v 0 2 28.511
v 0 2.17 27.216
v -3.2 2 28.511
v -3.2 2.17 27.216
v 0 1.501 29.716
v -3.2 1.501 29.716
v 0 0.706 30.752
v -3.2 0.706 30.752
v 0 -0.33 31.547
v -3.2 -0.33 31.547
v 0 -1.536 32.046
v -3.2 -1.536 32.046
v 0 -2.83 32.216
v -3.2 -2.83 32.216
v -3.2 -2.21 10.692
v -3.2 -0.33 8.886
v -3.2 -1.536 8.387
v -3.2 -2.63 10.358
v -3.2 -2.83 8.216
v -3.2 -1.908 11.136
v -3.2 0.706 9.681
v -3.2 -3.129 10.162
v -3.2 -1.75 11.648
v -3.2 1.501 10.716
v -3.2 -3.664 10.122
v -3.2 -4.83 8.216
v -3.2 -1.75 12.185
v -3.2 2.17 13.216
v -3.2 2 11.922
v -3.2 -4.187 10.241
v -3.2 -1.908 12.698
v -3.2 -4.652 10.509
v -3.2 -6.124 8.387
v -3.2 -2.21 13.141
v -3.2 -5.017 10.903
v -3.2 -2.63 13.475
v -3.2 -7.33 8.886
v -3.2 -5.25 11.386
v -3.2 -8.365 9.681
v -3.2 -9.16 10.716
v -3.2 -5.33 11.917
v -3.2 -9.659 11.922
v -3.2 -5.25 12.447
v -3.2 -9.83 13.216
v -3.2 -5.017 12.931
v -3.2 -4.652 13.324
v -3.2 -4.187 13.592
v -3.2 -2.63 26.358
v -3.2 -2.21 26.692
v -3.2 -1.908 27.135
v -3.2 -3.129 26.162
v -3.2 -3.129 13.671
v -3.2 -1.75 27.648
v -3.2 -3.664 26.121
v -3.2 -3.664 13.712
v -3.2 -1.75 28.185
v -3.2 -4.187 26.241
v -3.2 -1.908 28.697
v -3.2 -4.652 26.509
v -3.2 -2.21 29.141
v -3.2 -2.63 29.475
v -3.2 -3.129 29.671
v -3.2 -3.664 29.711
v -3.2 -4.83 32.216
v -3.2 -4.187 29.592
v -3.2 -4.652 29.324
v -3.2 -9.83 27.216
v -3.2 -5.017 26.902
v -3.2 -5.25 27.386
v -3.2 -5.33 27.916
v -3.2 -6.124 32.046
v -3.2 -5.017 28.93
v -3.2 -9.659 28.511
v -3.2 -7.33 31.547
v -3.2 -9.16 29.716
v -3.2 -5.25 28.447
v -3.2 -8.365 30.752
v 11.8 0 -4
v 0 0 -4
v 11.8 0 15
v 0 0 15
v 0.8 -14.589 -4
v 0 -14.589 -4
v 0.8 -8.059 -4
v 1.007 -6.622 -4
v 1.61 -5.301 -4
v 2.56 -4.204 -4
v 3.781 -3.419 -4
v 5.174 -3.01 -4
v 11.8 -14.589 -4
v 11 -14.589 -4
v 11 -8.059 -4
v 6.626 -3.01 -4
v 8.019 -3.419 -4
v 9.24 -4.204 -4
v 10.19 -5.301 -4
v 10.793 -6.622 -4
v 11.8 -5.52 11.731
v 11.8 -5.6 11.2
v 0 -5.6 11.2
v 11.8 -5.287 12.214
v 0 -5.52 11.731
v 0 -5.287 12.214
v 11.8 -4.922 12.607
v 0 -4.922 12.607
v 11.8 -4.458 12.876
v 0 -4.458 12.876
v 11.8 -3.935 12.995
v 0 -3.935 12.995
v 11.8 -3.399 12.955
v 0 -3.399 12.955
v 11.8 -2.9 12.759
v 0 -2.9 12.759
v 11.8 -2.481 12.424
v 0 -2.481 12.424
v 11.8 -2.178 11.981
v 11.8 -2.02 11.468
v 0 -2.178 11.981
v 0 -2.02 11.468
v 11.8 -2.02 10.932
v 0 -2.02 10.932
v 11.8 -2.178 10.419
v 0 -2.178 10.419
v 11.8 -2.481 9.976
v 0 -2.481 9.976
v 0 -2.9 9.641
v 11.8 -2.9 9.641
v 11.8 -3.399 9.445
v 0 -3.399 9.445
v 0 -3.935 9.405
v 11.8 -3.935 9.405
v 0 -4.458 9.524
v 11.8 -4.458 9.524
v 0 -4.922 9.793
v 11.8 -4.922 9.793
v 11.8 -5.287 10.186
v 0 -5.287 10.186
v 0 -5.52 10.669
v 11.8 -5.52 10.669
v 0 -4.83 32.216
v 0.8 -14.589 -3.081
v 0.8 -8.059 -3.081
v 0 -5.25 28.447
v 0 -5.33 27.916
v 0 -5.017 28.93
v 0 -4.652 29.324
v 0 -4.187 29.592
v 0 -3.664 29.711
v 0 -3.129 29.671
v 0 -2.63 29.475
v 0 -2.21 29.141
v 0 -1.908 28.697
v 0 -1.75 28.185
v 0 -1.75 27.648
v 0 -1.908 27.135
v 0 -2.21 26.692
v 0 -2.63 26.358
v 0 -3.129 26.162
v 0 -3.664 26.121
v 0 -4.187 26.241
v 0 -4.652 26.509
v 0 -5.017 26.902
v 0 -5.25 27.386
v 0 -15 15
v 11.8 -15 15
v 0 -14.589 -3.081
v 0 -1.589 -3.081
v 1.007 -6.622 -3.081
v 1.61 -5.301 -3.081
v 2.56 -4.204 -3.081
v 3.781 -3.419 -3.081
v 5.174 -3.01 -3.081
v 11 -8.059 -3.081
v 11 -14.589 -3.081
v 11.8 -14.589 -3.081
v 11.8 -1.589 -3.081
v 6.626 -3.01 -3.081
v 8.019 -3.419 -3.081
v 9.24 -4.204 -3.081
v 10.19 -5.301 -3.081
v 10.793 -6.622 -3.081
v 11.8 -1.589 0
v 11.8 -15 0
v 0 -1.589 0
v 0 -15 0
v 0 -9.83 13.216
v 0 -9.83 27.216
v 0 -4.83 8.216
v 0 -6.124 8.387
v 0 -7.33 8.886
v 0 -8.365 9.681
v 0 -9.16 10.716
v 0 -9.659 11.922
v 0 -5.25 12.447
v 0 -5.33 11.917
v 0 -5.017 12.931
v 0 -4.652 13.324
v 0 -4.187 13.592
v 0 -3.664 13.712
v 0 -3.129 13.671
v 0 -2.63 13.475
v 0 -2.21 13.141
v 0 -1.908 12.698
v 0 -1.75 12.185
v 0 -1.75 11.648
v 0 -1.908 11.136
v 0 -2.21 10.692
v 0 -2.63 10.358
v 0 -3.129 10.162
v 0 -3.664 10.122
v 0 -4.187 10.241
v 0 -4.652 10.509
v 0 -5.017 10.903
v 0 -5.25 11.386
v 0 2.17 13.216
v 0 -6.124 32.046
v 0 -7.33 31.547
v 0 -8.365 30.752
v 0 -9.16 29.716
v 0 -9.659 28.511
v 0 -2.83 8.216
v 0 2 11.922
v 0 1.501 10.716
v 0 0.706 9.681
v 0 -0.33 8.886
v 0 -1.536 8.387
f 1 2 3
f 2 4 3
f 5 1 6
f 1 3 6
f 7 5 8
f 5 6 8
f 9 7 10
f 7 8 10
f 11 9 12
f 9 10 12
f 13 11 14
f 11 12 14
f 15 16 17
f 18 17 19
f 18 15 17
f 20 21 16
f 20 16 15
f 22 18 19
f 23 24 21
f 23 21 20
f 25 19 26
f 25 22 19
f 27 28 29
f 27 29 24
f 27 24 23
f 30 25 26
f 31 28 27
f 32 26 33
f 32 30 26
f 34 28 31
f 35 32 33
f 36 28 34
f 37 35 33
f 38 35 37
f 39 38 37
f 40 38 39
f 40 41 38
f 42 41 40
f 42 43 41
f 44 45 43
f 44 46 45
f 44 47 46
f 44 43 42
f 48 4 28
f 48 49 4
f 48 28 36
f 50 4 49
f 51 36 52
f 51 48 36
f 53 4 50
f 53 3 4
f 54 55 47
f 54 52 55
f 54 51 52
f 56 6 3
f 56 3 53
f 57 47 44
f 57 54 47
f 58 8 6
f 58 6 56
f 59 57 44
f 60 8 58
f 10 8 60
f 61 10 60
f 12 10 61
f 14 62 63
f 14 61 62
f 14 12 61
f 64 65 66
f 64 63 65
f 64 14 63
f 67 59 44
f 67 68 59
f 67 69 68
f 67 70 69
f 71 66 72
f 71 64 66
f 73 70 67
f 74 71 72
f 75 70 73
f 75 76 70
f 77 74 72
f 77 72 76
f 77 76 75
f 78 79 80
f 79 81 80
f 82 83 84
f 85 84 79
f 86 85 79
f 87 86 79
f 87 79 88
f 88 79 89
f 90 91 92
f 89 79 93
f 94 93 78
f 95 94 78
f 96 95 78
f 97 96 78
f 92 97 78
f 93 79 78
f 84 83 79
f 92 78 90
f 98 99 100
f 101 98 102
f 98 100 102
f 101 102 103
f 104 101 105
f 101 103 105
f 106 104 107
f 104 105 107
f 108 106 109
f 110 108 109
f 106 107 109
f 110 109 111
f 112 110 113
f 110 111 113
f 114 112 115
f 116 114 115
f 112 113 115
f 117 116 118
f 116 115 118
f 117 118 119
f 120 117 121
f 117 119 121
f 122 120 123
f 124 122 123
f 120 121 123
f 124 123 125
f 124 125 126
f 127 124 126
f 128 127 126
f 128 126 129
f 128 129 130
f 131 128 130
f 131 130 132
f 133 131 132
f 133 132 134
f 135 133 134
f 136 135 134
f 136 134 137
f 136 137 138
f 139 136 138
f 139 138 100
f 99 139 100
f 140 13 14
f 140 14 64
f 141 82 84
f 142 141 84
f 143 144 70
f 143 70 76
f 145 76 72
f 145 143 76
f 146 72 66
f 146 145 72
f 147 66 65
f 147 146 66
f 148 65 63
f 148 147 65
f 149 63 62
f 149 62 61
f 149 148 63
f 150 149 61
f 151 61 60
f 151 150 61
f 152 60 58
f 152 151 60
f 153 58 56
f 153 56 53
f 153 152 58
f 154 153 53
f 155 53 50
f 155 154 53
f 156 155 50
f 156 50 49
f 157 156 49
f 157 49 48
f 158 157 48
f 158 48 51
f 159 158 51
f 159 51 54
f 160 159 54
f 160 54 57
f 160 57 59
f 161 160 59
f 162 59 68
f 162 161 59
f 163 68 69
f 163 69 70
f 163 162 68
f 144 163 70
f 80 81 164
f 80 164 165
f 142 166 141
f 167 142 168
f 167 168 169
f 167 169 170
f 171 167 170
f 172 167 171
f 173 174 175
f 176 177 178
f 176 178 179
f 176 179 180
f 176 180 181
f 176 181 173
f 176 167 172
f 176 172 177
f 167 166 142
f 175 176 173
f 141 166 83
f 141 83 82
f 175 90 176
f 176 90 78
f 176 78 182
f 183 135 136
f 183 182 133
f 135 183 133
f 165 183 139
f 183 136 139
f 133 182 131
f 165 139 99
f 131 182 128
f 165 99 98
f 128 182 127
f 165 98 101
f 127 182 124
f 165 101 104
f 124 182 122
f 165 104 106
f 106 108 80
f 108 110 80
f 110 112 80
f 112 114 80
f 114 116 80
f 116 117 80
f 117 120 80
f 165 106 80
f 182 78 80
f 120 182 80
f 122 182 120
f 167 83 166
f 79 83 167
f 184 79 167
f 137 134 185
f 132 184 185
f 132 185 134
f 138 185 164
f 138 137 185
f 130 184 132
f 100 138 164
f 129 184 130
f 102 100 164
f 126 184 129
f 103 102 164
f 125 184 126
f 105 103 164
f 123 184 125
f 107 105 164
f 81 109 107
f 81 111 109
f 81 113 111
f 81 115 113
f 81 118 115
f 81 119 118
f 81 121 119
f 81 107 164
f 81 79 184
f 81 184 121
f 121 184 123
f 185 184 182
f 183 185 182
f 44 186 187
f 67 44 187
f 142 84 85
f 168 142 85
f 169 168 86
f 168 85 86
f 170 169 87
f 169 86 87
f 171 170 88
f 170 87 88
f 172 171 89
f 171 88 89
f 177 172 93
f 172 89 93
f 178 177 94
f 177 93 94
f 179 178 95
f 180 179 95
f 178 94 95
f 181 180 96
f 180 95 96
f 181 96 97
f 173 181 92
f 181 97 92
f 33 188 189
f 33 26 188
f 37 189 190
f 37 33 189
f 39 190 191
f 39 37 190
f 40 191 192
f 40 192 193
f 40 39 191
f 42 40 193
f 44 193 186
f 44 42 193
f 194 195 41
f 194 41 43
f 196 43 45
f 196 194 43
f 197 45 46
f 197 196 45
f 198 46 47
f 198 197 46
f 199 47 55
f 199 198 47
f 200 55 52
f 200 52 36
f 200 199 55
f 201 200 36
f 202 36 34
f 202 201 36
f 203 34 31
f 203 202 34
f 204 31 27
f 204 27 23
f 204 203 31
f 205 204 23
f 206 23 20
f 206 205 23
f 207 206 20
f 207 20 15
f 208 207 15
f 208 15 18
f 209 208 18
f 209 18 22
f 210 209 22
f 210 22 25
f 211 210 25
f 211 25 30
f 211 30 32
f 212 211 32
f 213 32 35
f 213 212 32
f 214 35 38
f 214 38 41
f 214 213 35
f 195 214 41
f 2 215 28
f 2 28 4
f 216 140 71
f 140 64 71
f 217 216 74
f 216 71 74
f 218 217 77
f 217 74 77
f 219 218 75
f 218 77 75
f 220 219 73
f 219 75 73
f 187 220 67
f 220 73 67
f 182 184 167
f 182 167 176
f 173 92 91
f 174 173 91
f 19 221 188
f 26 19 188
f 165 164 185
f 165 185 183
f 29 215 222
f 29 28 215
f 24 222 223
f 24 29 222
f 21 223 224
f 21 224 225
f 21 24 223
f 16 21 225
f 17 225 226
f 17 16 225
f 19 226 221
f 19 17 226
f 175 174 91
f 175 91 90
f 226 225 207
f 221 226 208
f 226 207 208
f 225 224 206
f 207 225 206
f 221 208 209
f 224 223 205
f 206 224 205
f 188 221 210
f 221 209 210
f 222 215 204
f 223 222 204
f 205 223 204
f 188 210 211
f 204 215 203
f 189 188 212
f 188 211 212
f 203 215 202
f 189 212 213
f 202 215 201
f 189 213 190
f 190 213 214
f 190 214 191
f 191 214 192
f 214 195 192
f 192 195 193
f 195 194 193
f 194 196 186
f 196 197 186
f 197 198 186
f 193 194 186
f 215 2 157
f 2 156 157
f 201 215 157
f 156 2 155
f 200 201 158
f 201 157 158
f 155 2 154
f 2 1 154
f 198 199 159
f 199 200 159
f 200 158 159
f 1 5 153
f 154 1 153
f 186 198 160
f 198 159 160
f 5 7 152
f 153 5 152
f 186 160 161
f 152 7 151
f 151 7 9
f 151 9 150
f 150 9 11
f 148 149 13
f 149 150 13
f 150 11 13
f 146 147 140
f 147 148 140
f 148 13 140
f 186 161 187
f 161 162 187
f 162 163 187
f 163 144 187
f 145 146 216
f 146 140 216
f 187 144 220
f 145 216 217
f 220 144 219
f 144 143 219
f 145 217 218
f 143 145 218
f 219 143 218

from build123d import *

# Parameters (mm, degrees)
F0_W      = 11.8
F0_H      = 15
F1_DEPTH  = 15
F2_R      = 1.8
F3_DEPTH  = 25
F4_W      = 12
F4_H      = 24
F4_R      = 1.8
F5_DEPTH  = 3.2
F6_R      = 5
F7_W      = 11.8
F7_H      = 1.589112
F8_DEPTH  = 4
F9_W      = 11.8
F9_H      = 0.918874
F10_DEPTH = 13
F12_DEPTH = 2


with BuildPart() as f1:
    # F0 (on Front) → F1 (new body)
    with BuildSketch(Plane.XZ):
        with Locations((5.9, 7.5)):
            Rectangle(F0_W, F0_H)
    extrude(amount=F1_DEPTH)

    # F2 (on face) → F3 (cut)
    with BuildSketch(Plane(origin=(0, 0, 0), x_dir=(0, -1, 0), z_dir=(-1, 0, 0))):
        with Locations((3.8, 11.2)):
            Circle(F2_R)
    extrude(amount=-F3_DEPTH, mode=Mode.SUBTRACT)

    # F7 (on face) → F8 (join)
    with BuildSketch(Plane(origin=(0, 0, 0), x_dir=(1, 0, 0), z_dir=(0, 0, -1))):
        with Locations((5.9, 0.794556)):
            Rectangle(F7_W, F7_H)
    extrude(amount=F8_DEPTH)

    # F9 (on face) → F10 (join)
    with BuildSketch(Plane.XZ.offset(1.589112)):
        with Locations((5.9, -3.540563)):
            Rectangle(F9_W, F9_H)
    extrude(amount=F10_DEPTH)

    # F11 (on face) → F12 (cut)
    with BuildSketch(Plane(origin=(0, 0, -4), x_dir=(1, 0, 0), z_dir=(0, 0, -1))):
        with BuildLine():
            Line((11, 14.589112), (0.8, 14.589112))
            Line((0.8, 14.589112), (0.8, 8.058546))
            ThreePointArc((0.8, 8.058546), (5.9, 2.958546), (11, 8.058546))
            Line((11, 8.058546), (11, 14.589112))
        make_face()
    extrude(amount=-F12_DEPTH, mode=Mode.SUBTRACT)


with BuildPart() as f5:
    # F4 (on face) → F5 (new body)
    with BuildSketch(Plane(origin=(0, 0, 0), x_dir=(0, -1, 0), z_dir=(-1, 0, 0))):
        with Locations((3.829613, 20.216454)):
            Rectangle(F4_W, F4_H)
        with Locations((3.529613, 11.916554)):
            Circle(F4_R, mode=Mode.SUBTRACT)
        with Locations((3.529613, 27.916454)):
            Circle(F4_R, mode=Mode.SUBTRACT)
    extrude(amount=F5_DEPTH)

    # F6
    f6_edges = [f5.edges().sort_by_distance(p)[0] for p in [
        (-1.6, 2.170387, 32.216454),
        (-1.6, -9.829613, 32.216454),
        (-1.6, -9.829613, 8.216454),
        (-1.6, 2.170387, 8.216454),
    ]]
    fillet(f6_edges, radius=F6_R)


solid = Compound([f1.part, f5.part])
